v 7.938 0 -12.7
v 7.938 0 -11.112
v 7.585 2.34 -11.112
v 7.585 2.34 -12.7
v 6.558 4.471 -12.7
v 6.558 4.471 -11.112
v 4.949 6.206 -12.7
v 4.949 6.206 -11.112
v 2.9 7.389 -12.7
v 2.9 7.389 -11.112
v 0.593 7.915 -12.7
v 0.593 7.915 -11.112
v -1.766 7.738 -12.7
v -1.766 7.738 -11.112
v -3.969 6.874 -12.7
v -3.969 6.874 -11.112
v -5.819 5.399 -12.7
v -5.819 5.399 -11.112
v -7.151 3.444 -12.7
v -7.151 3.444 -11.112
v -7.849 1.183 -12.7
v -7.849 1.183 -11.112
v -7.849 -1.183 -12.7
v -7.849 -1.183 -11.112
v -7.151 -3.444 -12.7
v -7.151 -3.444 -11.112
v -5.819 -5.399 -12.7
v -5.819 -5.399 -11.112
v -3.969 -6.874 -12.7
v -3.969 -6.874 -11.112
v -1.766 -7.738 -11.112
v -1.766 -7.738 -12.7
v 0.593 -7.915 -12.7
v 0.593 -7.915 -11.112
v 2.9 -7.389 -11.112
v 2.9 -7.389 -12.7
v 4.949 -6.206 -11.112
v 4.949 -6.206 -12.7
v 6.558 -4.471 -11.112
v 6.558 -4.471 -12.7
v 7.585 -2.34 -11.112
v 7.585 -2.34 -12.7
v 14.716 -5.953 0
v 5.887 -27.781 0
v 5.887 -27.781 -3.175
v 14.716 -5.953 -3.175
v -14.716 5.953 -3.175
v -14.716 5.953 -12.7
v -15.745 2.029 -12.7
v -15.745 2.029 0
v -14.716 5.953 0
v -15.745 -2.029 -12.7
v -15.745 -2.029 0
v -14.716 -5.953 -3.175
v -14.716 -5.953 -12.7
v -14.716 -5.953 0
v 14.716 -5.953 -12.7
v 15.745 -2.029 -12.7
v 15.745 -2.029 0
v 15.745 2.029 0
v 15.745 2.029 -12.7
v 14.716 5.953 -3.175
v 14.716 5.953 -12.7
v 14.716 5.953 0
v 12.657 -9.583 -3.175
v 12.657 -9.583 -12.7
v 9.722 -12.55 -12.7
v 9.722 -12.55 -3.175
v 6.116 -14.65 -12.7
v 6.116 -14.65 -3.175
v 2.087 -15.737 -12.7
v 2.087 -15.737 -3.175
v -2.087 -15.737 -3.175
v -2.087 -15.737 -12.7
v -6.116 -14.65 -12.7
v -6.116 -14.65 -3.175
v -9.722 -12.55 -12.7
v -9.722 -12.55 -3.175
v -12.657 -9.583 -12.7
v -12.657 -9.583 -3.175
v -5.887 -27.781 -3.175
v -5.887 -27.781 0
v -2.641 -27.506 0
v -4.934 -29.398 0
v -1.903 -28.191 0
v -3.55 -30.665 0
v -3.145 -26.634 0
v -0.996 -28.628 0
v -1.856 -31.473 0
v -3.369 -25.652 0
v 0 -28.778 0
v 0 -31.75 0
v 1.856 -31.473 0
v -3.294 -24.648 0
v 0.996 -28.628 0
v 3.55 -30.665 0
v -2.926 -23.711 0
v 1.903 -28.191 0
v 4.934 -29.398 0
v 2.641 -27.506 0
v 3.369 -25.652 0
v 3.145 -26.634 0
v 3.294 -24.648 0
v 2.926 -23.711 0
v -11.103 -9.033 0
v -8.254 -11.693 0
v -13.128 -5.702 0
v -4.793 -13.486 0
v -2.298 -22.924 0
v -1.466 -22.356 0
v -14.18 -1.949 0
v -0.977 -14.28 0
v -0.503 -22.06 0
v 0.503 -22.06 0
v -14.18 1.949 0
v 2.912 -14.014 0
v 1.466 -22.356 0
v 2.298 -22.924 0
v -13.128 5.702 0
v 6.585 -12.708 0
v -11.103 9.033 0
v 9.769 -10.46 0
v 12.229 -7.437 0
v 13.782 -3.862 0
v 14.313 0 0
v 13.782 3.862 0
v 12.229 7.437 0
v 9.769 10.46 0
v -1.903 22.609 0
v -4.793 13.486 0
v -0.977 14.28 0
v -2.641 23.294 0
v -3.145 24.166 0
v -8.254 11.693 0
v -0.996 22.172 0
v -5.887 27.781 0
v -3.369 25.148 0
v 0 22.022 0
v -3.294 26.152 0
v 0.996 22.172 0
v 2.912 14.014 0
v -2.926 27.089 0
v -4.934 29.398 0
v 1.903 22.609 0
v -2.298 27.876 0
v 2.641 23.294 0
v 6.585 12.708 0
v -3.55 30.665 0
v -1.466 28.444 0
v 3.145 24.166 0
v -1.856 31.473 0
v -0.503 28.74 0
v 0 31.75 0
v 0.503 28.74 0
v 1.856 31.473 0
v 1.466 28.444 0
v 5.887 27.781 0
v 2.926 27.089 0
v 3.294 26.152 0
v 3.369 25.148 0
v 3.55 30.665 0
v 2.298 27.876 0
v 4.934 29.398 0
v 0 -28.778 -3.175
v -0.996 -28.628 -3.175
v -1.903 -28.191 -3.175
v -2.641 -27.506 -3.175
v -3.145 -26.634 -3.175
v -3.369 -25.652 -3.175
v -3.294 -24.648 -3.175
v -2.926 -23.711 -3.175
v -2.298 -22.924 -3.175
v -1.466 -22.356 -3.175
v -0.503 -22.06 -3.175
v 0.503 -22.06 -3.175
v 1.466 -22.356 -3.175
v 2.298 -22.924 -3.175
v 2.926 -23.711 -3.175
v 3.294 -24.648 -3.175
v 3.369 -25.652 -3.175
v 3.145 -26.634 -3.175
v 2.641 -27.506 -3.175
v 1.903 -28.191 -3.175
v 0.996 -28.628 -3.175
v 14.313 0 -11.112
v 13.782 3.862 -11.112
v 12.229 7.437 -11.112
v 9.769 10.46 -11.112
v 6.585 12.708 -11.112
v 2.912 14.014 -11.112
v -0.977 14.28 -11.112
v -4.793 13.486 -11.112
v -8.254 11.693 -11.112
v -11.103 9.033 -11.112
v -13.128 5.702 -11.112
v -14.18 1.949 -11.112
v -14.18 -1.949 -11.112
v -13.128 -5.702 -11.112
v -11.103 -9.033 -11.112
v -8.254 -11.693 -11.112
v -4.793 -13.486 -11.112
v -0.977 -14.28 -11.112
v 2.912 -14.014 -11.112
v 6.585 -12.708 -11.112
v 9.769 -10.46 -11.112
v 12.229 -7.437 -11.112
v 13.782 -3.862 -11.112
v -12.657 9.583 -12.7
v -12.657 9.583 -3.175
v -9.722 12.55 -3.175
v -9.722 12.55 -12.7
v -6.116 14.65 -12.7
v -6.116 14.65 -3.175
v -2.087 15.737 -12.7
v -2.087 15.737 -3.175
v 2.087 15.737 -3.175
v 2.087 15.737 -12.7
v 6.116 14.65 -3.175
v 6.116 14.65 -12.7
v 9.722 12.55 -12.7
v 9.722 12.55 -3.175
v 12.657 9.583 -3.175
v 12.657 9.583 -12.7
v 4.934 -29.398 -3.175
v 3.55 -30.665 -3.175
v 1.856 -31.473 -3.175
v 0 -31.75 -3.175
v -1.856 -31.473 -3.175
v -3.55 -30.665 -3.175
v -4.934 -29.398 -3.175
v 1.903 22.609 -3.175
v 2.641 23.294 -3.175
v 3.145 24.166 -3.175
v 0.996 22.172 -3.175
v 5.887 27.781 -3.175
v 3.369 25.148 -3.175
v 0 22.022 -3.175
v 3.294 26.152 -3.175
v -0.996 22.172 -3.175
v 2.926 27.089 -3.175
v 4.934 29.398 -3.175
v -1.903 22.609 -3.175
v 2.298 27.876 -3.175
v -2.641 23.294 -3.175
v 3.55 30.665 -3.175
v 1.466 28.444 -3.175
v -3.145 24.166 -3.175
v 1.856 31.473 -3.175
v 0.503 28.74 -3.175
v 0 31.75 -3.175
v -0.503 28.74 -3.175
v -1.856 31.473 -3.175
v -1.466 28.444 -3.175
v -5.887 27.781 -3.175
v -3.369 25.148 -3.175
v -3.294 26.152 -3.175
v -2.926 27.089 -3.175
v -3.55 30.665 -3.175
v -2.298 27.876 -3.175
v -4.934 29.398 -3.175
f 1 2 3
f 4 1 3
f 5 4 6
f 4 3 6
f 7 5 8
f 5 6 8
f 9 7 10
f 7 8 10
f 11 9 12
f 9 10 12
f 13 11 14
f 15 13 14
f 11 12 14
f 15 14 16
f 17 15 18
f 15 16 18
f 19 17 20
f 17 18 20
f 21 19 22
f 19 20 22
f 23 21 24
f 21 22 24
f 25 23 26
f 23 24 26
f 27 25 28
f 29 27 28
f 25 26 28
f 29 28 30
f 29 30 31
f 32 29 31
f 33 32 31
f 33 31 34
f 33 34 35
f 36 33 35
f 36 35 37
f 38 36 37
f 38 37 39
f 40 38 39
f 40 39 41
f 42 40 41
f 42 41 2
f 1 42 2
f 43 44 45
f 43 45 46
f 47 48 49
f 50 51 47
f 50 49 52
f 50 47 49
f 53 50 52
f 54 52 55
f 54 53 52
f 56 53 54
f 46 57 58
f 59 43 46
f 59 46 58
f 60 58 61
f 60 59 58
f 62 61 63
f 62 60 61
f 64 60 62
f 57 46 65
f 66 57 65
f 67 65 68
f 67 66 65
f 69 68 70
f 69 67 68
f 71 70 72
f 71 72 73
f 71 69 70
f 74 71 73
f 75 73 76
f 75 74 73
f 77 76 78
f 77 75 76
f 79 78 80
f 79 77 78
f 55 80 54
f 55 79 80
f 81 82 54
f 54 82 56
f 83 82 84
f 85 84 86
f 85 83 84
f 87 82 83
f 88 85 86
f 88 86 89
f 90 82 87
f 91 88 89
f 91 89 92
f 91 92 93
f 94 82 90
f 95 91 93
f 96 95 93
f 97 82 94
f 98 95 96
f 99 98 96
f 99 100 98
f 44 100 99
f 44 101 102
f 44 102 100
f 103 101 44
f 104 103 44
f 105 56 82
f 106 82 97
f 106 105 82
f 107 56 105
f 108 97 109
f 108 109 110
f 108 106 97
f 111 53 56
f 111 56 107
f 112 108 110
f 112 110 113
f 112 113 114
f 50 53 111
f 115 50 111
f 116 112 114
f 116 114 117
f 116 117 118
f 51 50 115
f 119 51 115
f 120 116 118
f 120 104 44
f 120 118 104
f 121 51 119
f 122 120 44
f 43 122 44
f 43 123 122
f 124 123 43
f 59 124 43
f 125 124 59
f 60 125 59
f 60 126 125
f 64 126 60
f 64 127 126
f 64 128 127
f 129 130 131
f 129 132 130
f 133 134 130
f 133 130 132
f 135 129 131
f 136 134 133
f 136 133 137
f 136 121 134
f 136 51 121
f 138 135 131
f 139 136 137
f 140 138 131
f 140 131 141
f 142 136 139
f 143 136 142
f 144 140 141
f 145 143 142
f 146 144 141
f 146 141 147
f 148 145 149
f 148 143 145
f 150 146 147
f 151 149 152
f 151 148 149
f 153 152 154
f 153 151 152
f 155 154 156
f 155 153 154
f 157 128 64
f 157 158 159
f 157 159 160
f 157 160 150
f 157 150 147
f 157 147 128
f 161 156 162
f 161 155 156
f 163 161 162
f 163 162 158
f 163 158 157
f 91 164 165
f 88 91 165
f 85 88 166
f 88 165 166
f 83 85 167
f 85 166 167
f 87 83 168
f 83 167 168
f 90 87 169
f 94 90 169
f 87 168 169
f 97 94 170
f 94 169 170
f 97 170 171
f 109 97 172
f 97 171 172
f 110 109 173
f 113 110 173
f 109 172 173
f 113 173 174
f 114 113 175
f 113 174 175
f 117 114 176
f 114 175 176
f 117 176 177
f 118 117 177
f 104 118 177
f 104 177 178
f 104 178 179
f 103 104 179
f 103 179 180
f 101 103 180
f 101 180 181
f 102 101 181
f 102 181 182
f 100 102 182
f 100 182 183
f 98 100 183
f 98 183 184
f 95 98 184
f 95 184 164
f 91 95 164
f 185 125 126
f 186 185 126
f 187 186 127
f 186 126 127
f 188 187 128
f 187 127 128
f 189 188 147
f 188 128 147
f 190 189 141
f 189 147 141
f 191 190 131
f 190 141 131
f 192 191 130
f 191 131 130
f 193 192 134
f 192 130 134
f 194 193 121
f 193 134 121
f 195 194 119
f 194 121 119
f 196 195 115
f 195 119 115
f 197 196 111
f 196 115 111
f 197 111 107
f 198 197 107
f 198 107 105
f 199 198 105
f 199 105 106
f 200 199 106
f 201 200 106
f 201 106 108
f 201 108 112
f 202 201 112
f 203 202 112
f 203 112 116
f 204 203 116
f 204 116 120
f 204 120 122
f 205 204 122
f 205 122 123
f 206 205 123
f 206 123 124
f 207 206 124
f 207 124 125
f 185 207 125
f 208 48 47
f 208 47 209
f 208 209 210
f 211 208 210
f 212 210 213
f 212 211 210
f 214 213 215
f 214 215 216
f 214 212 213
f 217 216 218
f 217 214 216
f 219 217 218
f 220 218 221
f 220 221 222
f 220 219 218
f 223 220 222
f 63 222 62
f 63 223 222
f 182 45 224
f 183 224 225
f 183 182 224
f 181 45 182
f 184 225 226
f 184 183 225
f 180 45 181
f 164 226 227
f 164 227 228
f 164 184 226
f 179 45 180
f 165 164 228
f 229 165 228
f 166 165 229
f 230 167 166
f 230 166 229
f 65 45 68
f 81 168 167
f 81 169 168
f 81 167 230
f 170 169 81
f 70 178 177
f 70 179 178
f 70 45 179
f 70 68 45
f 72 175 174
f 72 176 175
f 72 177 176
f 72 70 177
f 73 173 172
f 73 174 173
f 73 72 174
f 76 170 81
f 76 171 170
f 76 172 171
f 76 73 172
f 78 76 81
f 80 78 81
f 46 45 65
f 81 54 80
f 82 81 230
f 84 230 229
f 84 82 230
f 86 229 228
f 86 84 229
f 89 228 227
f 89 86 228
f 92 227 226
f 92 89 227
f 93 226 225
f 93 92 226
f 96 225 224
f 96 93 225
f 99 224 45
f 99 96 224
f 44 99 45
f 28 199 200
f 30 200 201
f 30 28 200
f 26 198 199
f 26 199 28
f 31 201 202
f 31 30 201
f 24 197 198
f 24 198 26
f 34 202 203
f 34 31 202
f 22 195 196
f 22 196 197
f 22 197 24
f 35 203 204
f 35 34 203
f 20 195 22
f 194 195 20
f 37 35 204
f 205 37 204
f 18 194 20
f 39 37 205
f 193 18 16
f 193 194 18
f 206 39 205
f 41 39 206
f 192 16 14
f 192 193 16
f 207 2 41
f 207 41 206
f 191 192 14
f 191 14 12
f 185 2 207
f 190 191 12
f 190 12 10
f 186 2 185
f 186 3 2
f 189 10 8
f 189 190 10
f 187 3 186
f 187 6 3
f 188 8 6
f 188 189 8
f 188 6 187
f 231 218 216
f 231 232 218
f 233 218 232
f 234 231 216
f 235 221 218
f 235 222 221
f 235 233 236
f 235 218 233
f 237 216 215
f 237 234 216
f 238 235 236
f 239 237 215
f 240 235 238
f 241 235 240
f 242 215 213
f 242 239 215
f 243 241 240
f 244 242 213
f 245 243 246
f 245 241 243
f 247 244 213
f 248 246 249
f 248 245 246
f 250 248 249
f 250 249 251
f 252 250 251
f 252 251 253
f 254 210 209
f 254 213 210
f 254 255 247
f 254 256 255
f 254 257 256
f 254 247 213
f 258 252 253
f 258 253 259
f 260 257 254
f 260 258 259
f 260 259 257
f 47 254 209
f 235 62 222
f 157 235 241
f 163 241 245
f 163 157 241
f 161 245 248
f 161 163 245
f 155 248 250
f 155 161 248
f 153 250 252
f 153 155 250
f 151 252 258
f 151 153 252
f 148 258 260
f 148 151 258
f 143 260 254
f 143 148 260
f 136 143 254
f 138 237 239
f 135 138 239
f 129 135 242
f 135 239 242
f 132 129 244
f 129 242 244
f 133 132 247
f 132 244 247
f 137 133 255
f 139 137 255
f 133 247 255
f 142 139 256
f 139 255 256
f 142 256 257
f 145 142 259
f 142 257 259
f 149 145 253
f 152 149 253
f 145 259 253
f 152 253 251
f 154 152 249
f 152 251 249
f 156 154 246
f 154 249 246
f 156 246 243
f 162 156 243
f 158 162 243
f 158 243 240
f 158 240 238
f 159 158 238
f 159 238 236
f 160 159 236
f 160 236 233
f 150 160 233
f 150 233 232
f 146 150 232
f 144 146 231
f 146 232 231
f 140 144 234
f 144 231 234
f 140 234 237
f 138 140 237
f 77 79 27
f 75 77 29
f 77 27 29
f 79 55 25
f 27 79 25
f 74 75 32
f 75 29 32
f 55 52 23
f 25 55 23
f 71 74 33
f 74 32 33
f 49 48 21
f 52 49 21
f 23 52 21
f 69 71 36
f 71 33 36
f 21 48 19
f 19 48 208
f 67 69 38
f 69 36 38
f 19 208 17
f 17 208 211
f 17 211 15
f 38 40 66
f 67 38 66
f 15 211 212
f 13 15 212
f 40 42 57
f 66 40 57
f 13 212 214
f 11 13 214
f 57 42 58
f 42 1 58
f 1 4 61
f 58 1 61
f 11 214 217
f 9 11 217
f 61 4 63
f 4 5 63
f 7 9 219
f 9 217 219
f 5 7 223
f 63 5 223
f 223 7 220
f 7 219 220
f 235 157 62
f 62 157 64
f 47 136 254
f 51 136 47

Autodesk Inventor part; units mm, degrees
ref_plane "YZ Plane" through (0, 0, 0) normal (1, 0, 0) x (0, 1, 0)
ref_plane "XZ Plane" through (0, 0, 0) normal (0, 1, 0) x (-1, 0, 0)
ref_plane "XY Plane" through (0, 0, 0) normal (0, 0, 1) x (1, 0, 0)
sketch "Sketch1" plane through (0, 0, 0) normal (0, 0, 1) x (1, 0, 0)
  circle A0 centre (0, 0) radius 14.2875 construction
  line L0 (-22.225, 0) -> (22.225, 0) projected
  line L1 (0, -44.45) -> (0, 44.45) projected
  arc A1 (5.8866, 27.7812) -> (-5.8866, 27.7812) centre (0, 25.4) ccw
  arc A2 (-5.8866, -27.7812) -> (5.8866, -27.7812) centre (0, -25.4) ccw
  line L2 (5.8866, -27.7812) -> (14.7165, -5.9531)
  line L3 (-5.8866, -27.7812) -> (-14.7165, -5.9531)
  line L4 (-5.8866, 27.7812) -> (-14.7165, 5.9531)
  line L5 (5.8866, 27.7812) -> (14.7165, 5.9531)
  arc A3 (-14.7165, 5.9531) -> (-14.7165, -5.9531) centre (0, 0) ccw
  arc A4 (14.7165, -5.9531) -> (14.7165, 5.9531) centre (0, 0) ccw
  circle A5 centre (0, 0) radius 7.9375
  dimension "d1" = 28.575
  dimension "d2" = 15.875
  dimension "d3" = 15.875
  dimension "d4" = 6.35
  dimension "d5" = 25.4
  dimension "d6" = 25.4
  dimension "d7" = 15.875
extrude "Extrusion1" add sketch "Sketch1" against normal blind 12.7 contours A3 L4 A1 L1 A5 L0 | L0 A5 L1 A2 L3 A3 | L1 A1 L5 A4 L0 A5 | A5 L0 A4 L2 A2 L1
sketch "Sketch2" plane through (0, 0, -12.7) normal (0, 0, -1) x (-1, 0, 0)
  line L0 (-5.8866, -27.7812) -> (-14.7165, -5.9531) projected
  arc A0 (-5.8866, -27.7812) -> (5.8866, -27.7812) centre (0, -25.4) ccw projected
  line L1 (14.7165, -5.9531) -> (5.8866, -27.7812) projected
  arc A1 (14.7165, -5.9531) -> (14.7165, 5.9531) centre (0, 0) ccw projected
  line L2 (5.8866, 27.7812) -> (14.7165, 5.9531) projected
  arc A2 (5.8866, 27.7812) -> (-5.8866, 27.7812) centre (0, 25.4) ccw projected
  line L3 (-14.7165, 5.9531) -> (-5.8866, 27.7812) projected
  arc A3 (-14.7165, 5.9531) -> (-14.7165, -5.9531) centre (0, 0) ccw projected
  circle A4 centre (0, 0) radius 15.875
extrude "Extrusion2" cut sketch "Sketch2" against normal blind 9.525 contours L0 A4 L1 A0 | L3 A2 L2 A4
sketch "Sketch3" plane through (0, 0, 0) normal (0, 0, 1) x (1, 0, 0)
  circle A0 centre (0, 0) radius 7.9375 projected
  arc A1 (-14.7165, 5.9531) -> (-14.7165, -5.9531) centre (0, 0) ccw projected
  circle A2 centre (0, 0) radius 14.3129
  dimension "d12" = 28.6258
extrude "Extrusion3" cut sketch "Sketch3" against normal blind 11.1125
sketch "Sketch4" plane through (0, 0, 0) normal (0, 0, 1) x (1, 0, 0)
  arc A0 (-5.8866, -27.7812) -> (5.8866, -27.7812) centre (0, -25.4) ccw projected
  arc A1 (5.8866, 27.7812) -> (-5.8866, 27.7812) centre (0, 25.4) ccw projected
hole "Hole1" at (0, 25.4, 0) at (0, -25.4, 0) direction (0, 0, -1) diameter 6.7564 end through all clearance for "Flat Head Machine Screw (82)" size "1/4" standard "Ansi Unified Screw Threads"
properties part number "bearing block wheel mount"
